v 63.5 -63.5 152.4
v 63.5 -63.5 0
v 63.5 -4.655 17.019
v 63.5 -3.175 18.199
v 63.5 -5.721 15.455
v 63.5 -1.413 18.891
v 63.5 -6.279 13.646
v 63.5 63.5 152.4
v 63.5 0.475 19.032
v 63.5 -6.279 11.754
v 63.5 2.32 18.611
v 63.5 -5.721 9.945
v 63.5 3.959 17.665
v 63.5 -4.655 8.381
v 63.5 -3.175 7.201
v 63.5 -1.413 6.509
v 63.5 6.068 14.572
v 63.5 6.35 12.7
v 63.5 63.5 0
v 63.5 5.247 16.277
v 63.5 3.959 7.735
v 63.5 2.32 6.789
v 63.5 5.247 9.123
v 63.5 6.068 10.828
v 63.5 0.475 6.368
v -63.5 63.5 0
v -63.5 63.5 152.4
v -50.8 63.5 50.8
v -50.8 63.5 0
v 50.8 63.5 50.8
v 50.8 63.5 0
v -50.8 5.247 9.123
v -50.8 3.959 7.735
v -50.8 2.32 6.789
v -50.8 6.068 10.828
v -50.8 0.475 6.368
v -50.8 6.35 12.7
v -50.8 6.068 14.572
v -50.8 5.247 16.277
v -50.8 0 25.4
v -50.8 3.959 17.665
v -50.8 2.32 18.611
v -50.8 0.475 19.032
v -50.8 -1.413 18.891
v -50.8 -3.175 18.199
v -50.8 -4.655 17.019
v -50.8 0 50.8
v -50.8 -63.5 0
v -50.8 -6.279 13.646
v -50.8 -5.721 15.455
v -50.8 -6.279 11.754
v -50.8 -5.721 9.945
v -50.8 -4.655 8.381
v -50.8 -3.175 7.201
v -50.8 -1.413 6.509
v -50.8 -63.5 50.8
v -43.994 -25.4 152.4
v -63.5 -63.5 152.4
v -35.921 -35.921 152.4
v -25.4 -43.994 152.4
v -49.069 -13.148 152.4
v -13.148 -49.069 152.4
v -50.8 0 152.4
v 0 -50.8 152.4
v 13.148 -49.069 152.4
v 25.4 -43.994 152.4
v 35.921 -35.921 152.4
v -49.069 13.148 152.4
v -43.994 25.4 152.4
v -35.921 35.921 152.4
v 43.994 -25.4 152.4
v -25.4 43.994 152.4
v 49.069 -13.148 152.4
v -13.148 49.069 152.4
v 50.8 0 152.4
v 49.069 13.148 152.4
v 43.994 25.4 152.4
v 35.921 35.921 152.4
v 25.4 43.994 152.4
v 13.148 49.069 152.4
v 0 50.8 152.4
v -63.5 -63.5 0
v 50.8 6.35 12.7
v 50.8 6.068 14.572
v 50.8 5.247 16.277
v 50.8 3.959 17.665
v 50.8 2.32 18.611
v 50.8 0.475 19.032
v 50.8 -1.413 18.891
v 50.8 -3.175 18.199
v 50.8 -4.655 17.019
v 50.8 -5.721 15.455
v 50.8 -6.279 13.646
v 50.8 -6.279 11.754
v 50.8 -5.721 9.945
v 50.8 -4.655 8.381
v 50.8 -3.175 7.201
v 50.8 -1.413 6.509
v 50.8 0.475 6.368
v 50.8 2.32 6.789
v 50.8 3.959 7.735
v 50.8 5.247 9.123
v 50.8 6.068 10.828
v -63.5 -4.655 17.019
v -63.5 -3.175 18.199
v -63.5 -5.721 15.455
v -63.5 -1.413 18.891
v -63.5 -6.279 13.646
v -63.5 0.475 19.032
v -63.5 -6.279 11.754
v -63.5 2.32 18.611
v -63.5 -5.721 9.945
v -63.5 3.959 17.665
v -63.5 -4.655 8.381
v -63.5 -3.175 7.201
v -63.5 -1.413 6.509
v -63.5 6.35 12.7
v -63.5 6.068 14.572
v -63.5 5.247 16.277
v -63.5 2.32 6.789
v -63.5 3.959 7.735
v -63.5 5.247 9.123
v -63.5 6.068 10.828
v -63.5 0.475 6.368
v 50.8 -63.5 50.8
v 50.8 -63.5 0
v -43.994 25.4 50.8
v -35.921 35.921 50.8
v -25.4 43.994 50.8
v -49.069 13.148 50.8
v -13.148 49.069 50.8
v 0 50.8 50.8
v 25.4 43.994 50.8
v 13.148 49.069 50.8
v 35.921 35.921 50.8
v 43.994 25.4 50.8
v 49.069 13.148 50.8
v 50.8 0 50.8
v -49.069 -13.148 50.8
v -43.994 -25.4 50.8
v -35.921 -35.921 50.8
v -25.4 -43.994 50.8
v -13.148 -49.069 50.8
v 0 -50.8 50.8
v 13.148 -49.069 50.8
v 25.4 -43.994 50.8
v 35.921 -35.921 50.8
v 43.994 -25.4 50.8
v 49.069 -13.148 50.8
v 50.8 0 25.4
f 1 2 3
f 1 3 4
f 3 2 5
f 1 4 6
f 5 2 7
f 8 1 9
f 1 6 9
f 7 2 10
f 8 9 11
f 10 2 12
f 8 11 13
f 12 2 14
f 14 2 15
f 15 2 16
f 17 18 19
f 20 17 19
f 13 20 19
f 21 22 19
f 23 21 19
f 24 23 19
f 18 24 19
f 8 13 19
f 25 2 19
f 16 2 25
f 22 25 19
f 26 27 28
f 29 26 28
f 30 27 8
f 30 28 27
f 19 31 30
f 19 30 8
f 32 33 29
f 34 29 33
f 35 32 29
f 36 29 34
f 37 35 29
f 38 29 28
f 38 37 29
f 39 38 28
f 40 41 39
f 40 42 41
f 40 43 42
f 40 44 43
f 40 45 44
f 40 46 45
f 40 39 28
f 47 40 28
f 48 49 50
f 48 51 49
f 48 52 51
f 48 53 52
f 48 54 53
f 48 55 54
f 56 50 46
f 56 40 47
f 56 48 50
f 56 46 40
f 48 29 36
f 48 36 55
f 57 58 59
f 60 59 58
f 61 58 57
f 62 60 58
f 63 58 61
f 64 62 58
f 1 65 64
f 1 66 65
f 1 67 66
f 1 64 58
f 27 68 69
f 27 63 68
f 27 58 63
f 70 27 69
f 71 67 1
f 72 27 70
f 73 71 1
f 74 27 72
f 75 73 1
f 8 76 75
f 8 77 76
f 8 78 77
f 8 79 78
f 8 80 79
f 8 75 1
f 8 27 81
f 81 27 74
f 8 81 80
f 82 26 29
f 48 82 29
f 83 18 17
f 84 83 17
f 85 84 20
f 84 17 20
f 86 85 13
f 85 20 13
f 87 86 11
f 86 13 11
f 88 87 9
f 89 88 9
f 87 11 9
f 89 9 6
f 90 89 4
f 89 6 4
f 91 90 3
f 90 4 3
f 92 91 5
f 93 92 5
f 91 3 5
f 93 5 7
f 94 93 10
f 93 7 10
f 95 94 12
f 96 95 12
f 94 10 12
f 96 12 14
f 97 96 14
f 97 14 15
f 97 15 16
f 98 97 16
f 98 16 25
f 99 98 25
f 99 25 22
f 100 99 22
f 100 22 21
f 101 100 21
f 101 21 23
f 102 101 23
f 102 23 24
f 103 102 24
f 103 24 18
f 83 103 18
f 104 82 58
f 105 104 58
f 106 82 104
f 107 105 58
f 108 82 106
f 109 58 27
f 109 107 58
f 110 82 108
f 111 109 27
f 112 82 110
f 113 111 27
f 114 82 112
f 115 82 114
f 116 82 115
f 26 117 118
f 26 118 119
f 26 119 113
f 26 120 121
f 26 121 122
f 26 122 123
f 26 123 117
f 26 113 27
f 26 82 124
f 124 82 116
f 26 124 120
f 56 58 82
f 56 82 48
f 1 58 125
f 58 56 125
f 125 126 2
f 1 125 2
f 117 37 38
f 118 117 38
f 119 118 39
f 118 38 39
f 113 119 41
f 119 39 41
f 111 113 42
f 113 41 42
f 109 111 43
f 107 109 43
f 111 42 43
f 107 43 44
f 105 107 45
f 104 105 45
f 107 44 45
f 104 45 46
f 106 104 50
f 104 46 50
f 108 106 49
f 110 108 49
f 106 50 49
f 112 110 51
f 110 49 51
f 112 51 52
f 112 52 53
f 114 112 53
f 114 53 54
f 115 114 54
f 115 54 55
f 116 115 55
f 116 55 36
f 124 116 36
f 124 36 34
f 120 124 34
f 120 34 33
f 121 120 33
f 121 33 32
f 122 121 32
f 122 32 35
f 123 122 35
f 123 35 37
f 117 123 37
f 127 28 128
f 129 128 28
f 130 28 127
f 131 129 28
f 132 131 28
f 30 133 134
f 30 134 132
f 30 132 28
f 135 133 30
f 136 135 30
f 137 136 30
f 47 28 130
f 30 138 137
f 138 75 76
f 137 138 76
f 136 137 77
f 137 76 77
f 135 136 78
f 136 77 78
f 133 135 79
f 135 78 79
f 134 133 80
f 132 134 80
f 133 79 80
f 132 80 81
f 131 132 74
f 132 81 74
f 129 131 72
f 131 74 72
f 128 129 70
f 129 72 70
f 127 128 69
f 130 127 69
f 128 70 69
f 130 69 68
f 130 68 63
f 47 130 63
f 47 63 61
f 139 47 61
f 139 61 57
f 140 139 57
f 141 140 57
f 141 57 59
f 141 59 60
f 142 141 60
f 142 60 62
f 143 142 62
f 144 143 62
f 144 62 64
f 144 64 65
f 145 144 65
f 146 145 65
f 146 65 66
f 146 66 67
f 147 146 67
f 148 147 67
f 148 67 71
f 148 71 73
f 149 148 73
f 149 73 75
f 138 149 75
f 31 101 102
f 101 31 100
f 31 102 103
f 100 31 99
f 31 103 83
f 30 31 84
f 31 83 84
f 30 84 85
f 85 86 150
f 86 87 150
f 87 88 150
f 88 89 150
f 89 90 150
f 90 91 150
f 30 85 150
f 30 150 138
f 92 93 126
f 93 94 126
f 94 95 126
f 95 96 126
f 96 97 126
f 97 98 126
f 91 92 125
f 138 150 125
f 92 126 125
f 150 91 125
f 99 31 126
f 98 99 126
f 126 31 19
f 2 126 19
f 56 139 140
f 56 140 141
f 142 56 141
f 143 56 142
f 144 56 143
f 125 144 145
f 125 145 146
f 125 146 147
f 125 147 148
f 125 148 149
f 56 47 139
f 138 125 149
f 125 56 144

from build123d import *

# Parameters (mm, degrees)
F0_W     = 127
F0_H     = 127
F1_DEPTH = 152.4
F2_R     = 50.8
F3_DEPTH = 127
F4_W     = 101.6
F4_H     = 119.7034602863
F5_DEPTH = 63.5
F6_R     = 6.35
F7_DEPTH = 127


with BuildPart() as f1:
    # F0 (on Top) → F1 (new body)
    with BuildSketch(Plane.XY):
        Rectangle(F0_W, F0_H)
    extrude(amount=F1_DEPTH)

    # F2 (on face) → F3 (cut)
    with BuildSketch(Plane.XY.offset(152.4)):
        Circle(F2_R)
    extrude(amount=-F3_DEPTH, mode=Mode.SUBTRACT)

    # F4 (on Front) → F5 (cut, symmetric)
    with BuildSketch(Plane.XZ):
        with Locations((0, -9.0517301432)):
            Rectangle(F4_W, F4_H)
    extrude(amount=F5_DEPTH, both=True, mode=Mode.SUBTRACT)

    # F6 (on face) → F7 (cut)
    with BuildSketch(Plane.YZ.offset(63.5)):
        with Locations((0, 12.7)):
            Circle(F6_R)
    extrude(amount=-F7_DEPTH, mode=Mode.SUBTRACT)


solid = f1.part
